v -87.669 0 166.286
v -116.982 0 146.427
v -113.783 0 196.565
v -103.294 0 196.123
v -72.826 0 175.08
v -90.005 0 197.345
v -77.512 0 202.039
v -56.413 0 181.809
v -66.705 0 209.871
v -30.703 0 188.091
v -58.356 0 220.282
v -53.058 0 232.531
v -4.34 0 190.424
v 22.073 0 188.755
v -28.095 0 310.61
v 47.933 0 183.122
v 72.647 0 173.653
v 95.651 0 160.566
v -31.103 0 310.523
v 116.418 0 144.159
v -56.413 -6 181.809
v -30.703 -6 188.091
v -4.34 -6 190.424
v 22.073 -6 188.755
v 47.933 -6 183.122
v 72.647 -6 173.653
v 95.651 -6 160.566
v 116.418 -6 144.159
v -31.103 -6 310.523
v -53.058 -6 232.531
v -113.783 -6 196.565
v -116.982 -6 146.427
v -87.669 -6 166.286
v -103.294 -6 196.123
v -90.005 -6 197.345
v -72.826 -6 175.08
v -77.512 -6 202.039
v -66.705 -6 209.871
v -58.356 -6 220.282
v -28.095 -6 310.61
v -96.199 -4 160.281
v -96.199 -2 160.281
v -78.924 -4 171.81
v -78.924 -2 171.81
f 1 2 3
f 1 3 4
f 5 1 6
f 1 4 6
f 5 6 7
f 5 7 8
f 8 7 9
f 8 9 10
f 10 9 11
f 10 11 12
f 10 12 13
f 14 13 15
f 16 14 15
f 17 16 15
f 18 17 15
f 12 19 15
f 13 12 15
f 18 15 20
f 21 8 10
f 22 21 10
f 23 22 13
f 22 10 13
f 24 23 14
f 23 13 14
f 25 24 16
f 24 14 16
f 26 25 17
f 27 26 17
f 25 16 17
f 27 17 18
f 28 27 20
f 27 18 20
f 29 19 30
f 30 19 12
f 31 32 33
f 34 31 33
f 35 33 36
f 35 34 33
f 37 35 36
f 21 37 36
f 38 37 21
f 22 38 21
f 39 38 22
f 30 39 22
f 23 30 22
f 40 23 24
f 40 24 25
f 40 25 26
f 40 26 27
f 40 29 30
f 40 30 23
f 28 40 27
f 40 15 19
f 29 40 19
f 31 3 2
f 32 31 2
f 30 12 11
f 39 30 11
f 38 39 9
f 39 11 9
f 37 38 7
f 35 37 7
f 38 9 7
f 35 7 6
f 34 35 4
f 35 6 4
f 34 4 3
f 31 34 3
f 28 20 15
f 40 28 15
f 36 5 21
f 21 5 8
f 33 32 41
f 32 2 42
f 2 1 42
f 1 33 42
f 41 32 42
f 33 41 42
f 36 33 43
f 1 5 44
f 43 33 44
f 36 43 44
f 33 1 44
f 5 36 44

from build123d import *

# Parameters (mm, degrees)
F1_DEPTH = 6


with BuildPart() as f1:
    # F0 (on Front) → F1 (new body)
    with BuildSketch(Plane.XZ):
        with BuildLine():
            Line((-113.7830221973, 196.5653101416), (-116.9823558728, 146.4273122476))
            add(Edge.make_bspline(
                [(-116.9823558728, 146.4273122476), (-91.5295582515, 161.7084143763), (-84.4563773973, 172.3099058233), (-56.413200461, 181.8094376312)],
                knots=[0.6217299922, 0.6217299922, 0.6217299922, 0.6217299922, 1, 1, 1, 1], degree=3))
            ThreePointArc((-56.413200461, 181.8094376312), (35.1094960363, 186.4278723491), (116.4179808184, 144.1589213822))
            Line((116.4179808184, 144.1589213822), (-28.0945999151, 310.6102859554))
            Line((-28.0945999151, 310.6102859554), (-31.1034692521, 310.5229280694))
            Line((-31.1034692521, 310.5229280694), (-53.0575460655, 232.5305113428))
            ThreePointArc((-53.0575460655, 232.5305113428), (-71.8460560006, 205.592638023), (-103.2941289159, 196.1229054773))
            Line((-103.2941289159, 196.1229054773), (-113.7830221973, 196.5653101416))
        make_face()
    extrude(amount=F1_DEPTH)


solid = f1.part
